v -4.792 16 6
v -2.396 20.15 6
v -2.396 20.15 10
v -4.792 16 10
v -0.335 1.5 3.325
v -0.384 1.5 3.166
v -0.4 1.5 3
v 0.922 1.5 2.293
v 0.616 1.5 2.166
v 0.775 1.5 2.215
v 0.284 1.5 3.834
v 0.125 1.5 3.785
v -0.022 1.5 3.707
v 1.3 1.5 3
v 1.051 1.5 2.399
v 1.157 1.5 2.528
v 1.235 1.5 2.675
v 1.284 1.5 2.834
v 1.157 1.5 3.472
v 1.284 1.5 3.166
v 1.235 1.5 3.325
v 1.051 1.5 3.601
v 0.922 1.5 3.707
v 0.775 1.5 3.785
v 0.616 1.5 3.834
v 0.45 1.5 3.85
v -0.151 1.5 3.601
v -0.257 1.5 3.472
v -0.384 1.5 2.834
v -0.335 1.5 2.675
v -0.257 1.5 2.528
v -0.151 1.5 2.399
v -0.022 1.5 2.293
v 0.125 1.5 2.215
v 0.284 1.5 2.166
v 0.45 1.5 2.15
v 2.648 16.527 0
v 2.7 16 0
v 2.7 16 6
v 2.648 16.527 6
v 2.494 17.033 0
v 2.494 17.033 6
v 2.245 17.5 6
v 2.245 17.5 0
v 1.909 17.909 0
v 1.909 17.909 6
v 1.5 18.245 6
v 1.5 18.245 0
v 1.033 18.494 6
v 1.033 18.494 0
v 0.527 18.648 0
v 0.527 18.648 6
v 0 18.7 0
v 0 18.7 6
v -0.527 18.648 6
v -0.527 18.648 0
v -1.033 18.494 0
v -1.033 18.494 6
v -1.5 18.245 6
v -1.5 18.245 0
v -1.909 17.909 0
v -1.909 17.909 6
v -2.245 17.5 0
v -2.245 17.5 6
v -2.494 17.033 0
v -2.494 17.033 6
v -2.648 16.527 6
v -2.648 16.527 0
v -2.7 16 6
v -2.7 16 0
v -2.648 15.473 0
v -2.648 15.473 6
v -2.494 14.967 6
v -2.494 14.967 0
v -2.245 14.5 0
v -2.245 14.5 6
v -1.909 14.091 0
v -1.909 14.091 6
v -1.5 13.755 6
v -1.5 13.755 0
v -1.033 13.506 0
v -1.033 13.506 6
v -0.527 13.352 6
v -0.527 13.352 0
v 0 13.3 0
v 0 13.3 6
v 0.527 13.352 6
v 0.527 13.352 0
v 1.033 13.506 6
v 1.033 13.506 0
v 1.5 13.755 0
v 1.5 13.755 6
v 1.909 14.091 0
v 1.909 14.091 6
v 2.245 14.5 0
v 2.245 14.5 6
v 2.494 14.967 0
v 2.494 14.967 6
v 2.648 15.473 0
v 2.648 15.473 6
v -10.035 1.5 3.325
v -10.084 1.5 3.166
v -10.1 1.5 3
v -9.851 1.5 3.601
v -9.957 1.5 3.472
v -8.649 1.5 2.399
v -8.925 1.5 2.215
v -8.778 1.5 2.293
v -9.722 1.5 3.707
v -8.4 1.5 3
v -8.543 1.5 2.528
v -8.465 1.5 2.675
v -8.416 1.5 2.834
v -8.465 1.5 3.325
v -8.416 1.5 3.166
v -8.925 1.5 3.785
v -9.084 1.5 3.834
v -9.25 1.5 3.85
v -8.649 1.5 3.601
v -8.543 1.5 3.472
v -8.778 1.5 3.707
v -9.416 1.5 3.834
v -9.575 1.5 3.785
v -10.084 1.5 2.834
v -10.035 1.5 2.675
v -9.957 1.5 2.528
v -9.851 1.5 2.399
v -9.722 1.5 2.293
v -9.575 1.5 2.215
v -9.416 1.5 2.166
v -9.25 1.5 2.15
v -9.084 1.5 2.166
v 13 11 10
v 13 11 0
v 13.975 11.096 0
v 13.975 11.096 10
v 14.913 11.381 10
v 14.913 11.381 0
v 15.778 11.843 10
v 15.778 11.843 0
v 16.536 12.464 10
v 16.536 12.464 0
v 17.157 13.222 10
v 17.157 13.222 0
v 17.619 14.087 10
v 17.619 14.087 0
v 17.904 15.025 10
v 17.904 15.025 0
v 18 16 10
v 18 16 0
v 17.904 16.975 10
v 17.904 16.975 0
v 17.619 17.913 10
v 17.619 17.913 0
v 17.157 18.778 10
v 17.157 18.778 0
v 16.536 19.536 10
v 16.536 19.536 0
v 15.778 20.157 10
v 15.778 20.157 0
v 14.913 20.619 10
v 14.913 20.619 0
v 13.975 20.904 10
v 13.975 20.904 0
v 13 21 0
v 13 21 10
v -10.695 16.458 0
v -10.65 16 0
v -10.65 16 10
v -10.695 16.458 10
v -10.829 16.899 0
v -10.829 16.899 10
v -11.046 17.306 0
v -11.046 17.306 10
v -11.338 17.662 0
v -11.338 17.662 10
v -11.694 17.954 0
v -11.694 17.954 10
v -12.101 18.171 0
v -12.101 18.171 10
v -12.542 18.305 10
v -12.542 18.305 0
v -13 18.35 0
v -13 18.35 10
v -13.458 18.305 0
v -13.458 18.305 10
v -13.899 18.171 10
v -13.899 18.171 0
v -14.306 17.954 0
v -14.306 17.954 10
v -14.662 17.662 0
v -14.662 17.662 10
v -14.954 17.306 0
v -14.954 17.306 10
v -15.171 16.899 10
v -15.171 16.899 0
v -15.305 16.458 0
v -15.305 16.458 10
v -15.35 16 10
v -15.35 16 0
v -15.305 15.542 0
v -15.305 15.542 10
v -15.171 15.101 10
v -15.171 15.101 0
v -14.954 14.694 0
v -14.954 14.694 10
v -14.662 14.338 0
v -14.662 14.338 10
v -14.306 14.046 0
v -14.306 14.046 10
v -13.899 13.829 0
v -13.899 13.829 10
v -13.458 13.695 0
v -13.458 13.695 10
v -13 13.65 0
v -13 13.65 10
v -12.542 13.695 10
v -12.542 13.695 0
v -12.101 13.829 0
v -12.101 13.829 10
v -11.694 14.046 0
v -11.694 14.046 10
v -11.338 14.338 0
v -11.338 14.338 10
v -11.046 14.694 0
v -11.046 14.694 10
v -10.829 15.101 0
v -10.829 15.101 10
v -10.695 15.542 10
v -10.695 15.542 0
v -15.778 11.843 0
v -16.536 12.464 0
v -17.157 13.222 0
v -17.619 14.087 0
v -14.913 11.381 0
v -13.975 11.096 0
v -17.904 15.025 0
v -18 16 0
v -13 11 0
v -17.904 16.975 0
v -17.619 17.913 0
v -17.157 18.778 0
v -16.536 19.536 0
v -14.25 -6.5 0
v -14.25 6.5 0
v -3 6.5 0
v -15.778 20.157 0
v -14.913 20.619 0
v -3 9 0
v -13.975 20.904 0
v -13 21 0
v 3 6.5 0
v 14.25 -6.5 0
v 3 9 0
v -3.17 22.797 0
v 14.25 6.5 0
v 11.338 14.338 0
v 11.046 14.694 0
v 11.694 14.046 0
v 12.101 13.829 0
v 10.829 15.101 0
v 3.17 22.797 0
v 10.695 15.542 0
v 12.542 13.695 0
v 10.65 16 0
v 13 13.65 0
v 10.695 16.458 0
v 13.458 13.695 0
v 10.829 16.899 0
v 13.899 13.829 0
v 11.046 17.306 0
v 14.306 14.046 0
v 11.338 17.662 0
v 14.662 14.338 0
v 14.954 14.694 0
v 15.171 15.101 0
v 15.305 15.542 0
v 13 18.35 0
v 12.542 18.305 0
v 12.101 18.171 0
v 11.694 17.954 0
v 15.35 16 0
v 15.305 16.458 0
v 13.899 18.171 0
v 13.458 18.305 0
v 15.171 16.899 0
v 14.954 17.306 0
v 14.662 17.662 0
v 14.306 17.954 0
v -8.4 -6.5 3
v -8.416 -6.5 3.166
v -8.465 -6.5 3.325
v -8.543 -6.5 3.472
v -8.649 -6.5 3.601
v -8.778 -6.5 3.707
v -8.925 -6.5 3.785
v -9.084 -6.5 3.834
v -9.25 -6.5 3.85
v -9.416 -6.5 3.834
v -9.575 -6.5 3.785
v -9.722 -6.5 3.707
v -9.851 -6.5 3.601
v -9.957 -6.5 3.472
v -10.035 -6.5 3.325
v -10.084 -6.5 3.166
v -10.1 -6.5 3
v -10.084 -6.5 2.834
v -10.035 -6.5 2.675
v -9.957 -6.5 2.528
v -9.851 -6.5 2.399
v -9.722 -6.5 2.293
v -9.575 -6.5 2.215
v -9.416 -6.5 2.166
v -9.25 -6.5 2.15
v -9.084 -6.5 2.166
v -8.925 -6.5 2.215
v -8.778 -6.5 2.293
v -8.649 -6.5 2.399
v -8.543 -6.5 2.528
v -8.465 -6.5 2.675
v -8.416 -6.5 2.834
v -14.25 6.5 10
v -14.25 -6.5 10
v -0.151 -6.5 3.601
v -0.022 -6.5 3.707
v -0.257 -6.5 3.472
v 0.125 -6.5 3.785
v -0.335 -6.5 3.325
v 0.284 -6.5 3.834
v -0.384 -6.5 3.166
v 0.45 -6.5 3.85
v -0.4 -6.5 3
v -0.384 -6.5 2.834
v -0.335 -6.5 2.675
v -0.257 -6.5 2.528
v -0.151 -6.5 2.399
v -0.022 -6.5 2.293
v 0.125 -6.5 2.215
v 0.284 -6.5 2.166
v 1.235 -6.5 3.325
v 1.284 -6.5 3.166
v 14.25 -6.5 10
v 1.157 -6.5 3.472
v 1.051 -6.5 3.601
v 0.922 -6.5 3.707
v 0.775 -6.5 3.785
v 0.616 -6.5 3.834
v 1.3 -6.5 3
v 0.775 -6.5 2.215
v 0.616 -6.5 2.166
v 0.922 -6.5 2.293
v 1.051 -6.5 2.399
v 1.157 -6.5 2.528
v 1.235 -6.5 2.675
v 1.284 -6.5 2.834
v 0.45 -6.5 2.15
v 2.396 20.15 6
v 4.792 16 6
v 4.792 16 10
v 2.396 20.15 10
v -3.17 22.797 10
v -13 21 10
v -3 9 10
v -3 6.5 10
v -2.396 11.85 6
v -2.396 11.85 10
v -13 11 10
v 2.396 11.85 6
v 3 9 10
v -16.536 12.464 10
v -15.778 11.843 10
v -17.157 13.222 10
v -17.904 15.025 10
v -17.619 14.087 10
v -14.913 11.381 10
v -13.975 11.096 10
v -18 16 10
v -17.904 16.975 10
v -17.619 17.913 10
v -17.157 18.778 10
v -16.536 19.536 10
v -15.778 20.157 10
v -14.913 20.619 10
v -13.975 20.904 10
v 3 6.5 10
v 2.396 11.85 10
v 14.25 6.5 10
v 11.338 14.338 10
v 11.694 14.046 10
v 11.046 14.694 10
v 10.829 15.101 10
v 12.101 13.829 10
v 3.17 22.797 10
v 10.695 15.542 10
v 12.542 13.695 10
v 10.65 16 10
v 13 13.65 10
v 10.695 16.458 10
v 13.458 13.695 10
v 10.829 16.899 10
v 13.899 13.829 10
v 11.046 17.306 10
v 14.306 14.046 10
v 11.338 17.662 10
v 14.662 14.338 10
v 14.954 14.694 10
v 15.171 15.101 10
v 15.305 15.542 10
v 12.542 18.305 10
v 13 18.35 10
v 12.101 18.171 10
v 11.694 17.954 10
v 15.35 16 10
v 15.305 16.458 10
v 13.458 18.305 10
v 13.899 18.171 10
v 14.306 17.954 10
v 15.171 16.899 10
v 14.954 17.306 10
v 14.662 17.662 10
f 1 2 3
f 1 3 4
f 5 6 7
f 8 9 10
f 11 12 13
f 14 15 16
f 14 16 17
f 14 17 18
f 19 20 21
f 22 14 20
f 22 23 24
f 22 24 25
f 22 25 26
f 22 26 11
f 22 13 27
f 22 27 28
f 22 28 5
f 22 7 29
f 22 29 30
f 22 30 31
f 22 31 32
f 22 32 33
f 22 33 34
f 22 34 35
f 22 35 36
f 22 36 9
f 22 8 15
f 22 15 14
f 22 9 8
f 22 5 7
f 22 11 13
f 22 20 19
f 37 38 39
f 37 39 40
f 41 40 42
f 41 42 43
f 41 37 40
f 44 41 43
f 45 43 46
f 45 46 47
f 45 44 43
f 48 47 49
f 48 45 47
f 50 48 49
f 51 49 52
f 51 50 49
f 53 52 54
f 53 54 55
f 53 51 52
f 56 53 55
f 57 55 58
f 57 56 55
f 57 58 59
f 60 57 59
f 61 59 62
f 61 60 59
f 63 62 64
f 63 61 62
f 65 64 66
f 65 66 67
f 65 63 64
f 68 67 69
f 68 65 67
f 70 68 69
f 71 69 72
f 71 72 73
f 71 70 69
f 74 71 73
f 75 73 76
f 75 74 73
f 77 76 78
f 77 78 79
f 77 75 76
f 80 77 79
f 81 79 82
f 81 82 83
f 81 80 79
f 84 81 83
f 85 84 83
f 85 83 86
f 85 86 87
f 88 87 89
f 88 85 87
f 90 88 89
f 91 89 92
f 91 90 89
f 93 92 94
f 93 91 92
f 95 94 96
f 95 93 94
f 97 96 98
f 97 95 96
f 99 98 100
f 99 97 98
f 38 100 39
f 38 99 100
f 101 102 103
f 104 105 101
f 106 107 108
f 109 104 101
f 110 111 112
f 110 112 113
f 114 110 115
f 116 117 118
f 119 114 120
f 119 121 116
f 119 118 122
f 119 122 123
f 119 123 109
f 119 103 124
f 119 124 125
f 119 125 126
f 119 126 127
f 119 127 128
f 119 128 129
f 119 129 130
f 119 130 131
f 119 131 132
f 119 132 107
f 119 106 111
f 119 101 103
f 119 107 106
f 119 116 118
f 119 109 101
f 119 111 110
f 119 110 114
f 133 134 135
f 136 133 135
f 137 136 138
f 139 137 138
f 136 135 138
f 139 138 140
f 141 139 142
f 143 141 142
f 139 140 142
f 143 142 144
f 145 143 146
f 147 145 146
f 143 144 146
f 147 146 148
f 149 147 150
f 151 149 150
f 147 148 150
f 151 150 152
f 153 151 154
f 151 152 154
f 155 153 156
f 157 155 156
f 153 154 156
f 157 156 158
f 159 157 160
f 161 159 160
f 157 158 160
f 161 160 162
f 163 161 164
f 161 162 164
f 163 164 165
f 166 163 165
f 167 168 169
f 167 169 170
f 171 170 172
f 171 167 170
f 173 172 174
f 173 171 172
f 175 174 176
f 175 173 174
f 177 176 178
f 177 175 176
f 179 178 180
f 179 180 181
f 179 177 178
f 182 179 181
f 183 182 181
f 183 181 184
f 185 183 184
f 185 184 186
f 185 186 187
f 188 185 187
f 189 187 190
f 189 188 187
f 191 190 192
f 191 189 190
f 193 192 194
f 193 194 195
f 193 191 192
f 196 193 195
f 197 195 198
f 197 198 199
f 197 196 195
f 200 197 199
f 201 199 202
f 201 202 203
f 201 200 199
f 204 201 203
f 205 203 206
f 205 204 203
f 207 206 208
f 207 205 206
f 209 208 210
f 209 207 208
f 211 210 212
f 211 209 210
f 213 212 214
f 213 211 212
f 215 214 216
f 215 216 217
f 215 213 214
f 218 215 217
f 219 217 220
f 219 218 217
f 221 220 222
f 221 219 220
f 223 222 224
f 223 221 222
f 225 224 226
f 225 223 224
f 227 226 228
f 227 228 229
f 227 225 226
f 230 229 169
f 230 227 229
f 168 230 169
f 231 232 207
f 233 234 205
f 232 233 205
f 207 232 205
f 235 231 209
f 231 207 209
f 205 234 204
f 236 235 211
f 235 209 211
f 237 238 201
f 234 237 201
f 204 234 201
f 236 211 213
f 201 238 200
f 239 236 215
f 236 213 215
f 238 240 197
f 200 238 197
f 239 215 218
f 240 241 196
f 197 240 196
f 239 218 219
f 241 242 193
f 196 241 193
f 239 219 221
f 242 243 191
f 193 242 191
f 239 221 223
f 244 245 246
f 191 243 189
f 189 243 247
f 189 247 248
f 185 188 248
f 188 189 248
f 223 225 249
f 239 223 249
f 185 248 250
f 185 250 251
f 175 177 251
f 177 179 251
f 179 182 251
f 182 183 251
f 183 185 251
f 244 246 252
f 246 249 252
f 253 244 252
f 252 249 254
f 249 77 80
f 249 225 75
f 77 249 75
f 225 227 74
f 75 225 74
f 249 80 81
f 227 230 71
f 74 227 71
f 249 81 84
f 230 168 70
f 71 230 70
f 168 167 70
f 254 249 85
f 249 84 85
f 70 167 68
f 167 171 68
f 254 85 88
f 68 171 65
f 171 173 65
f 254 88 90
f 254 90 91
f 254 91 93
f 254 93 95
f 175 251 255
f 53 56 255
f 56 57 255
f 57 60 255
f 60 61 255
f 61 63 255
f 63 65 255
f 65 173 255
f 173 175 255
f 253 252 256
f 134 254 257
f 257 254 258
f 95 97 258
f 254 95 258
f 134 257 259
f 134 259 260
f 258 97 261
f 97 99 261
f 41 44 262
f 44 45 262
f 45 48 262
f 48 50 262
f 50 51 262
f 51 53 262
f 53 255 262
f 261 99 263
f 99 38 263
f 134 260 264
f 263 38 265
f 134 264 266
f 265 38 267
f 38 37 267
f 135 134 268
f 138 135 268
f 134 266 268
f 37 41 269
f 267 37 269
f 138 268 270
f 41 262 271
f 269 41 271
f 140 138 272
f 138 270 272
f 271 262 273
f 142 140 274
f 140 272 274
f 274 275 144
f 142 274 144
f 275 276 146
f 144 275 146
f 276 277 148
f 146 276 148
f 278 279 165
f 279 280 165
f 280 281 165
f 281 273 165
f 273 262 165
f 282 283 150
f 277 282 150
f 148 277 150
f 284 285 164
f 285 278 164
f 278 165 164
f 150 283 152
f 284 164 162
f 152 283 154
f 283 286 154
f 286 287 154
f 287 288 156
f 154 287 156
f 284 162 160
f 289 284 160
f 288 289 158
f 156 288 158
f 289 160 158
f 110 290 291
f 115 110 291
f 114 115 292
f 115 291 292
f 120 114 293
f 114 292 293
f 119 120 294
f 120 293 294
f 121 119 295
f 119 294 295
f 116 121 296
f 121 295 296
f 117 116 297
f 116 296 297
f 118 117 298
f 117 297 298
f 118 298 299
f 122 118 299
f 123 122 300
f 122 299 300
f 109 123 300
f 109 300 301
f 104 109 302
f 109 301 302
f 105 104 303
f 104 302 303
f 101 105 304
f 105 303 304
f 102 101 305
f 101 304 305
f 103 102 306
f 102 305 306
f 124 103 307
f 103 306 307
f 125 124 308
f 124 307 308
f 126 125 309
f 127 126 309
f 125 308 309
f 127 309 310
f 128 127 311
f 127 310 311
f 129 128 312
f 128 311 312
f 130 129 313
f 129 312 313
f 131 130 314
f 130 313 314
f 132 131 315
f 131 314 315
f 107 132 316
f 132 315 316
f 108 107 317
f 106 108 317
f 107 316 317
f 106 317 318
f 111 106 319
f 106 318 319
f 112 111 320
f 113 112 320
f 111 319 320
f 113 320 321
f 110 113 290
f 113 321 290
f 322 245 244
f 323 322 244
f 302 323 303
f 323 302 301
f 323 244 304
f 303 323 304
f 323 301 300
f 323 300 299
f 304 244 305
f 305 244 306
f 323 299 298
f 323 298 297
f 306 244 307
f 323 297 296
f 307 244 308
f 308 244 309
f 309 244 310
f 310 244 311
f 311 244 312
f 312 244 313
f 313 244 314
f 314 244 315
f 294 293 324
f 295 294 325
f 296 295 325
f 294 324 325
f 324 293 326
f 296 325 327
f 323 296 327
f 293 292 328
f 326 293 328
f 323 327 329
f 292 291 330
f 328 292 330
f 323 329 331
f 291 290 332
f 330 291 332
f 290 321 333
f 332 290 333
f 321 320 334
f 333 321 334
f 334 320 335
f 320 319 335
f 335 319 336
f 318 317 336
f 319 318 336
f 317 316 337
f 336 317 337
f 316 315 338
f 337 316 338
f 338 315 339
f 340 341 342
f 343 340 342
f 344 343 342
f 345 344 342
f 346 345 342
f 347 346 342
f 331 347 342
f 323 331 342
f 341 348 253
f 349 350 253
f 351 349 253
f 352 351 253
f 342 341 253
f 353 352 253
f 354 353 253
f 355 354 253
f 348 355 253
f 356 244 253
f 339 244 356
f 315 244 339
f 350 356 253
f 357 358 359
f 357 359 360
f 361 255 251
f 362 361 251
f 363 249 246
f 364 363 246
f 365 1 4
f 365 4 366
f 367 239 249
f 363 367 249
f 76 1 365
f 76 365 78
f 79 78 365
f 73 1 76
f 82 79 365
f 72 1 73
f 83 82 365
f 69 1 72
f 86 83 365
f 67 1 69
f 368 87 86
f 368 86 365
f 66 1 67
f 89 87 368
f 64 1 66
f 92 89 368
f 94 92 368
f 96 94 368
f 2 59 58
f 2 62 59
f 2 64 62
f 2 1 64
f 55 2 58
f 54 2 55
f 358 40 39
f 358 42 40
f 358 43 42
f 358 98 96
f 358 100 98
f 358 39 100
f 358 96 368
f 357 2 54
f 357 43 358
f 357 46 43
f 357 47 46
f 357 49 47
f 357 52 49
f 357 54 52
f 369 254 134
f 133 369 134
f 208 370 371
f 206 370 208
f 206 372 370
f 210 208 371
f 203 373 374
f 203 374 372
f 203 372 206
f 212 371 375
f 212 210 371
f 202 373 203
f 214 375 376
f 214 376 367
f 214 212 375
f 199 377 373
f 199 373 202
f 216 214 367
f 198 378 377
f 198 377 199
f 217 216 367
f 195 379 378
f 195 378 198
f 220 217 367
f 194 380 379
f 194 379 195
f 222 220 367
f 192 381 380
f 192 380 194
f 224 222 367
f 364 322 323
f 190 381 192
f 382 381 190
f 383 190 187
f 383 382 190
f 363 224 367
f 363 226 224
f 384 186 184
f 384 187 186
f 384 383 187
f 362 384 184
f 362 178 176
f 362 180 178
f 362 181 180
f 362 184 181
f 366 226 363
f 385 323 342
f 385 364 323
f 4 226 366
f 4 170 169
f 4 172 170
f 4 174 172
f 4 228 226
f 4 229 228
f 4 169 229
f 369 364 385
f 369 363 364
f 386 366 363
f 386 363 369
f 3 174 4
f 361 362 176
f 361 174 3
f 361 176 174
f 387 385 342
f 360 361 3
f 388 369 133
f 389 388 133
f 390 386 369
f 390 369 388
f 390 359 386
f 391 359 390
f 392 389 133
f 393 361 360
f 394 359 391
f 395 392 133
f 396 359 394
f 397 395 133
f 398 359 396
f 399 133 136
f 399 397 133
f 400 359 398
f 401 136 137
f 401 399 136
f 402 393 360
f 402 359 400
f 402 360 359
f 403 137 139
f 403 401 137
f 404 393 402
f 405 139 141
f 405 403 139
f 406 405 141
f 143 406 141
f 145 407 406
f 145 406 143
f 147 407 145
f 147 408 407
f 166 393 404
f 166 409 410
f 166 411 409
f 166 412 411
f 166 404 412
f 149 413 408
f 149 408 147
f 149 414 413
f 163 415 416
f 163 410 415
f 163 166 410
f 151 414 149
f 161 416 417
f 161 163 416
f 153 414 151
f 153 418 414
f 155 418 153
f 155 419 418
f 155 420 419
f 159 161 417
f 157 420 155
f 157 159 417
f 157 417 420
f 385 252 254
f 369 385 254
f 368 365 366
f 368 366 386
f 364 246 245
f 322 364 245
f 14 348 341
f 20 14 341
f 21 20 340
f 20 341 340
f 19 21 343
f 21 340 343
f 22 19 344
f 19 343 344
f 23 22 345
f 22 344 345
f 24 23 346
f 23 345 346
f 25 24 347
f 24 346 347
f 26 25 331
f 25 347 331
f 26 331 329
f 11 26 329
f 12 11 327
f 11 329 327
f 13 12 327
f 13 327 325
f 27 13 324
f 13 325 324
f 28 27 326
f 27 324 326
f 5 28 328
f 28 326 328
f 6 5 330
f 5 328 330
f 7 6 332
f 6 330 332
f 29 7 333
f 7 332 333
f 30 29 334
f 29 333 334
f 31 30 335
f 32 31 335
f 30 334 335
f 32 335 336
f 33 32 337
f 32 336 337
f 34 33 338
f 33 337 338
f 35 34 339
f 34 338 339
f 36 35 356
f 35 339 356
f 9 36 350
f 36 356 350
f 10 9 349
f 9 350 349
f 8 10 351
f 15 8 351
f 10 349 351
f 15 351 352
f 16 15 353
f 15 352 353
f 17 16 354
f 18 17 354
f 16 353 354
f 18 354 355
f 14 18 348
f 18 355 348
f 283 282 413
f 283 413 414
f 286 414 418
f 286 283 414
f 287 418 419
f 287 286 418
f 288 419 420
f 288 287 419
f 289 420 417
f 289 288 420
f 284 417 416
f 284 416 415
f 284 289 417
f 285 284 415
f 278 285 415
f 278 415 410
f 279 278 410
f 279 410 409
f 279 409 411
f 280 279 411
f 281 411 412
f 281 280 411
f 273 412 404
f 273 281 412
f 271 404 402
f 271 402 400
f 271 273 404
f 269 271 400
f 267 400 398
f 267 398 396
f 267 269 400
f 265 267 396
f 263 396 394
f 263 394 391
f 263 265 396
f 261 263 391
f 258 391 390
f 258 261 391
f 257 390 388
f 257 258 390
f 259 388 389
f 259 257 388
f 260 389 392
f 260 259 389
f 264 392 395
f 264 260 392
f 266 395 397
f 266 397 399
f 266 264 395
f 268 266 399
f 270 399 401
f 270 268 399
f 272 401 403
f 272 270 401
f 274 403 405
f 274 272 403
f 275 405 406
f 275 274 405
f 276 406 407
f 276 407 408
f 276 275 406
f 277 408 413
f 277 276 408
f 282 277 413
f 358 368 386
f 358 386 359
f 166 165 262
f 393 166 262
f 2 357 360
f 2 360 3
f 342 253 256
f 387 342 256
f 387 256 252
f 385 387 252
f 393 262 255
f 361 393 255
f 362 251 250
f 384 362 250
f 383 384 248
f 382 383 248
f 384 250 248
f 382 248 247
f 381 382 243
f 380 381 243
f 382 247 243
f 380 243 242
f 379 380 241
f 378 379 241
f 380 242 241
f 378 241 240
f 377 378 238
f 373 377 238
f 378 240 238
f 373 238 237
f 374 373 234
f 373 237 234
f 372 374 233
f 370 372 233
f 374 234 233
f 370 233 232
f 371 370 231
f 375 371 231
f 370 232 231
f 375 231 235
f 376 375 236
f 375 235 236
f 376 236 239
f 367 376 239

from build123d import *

# Parameters (mm, degrees)
ESQUISSE1_R            = 2.35
FORME_PRINCIPALE_DEPTH = 10
ESQUISSE1_5_R          = 2.7
ECROU_DEPTH            = 6
ESQUISSE3_R            = 0.85
VIS_DEPTH              = 8


with BuildPart() as part:
    # Esquisse1 → forme principale (new body)
    with BuildSketch(Plane.XY):
        with BuildLine():
            Line((-14.25, 6.5), (-14.25, -6.5))
            Line((-14.25, -6.5), (14.25, -6.5))
            Line((14.25, -6.5), (14.25, 6.5))
            Line((14.25, 6.5), (3, 6.5))
            Line((3, 6.5), (3, 9))
            Line((3, 9), (13, 11))
            ThreePointArc((13, 11), (18, 16), (13, 21))
            Line((13, 21), (3.169636963, 22.797308403))
            Line((3.169636963, 22.797308403), (-3.169636963, 22.797308403))
            Line((-3.169636963, 22.797308403), (-13, 21))
            ThreePointArc((-13, 21), (-18, 16), (-13, 11))
            Line((-13, 11), (-3, 9))
            Line((-3, 9), (-3, 6.5))
            Line((-3, 6.5), (-14.25, 6.5))
        make_face()
        with Locations((-13, 16)):
            Circle(ESQUISSE1_R, mode=Mode.SUBTRACT)
        Polygon((4.792007234, 16), (2.396003617, 11.85), (-2.396003617, 11.85), (-4.792007234, 16), (-2.396003617, 20.15), (2.396003617, 20.15), align=None, mode=Mode.SUBTRACT)
        with Locations((13, 16)):
            Circle(ESQUISSE1_R, mode=Mode.SUBTRACT)
    extrude(amount=FORME_PRINCIPALE_DEPTH)

    # Esquisse1<5> → ecrou (add)
    with BuildSketch(Plane.XY):
        Polygon((-2.396003617, 11.85), (2.396003617, 11.85), (4.792007234, 16), (2.396003617, 20.15), (-2.396003617, 20.15), (-4.792007234, 16), align=None)
        with Locations((0, 16)):
            Circle(ESQUISSE1_5_R, mode=Mode.SUBTRACT)
    extrude(amount=ECROU_DEPTH)

    # Esquisse3 → vis (cut)
    with BuildSketch(Plane.XZ.offset(6.5)):
        with Locations((-9.25, 3)):
            Circle(ESQUISSE3_R)
        with Locations((0.45, 3)):
            Circle(ESQUISSE3_R)
    extrude(amount=-VIS_DEPTH, mode=Mode.SUBTRACT)


solid = part.part
